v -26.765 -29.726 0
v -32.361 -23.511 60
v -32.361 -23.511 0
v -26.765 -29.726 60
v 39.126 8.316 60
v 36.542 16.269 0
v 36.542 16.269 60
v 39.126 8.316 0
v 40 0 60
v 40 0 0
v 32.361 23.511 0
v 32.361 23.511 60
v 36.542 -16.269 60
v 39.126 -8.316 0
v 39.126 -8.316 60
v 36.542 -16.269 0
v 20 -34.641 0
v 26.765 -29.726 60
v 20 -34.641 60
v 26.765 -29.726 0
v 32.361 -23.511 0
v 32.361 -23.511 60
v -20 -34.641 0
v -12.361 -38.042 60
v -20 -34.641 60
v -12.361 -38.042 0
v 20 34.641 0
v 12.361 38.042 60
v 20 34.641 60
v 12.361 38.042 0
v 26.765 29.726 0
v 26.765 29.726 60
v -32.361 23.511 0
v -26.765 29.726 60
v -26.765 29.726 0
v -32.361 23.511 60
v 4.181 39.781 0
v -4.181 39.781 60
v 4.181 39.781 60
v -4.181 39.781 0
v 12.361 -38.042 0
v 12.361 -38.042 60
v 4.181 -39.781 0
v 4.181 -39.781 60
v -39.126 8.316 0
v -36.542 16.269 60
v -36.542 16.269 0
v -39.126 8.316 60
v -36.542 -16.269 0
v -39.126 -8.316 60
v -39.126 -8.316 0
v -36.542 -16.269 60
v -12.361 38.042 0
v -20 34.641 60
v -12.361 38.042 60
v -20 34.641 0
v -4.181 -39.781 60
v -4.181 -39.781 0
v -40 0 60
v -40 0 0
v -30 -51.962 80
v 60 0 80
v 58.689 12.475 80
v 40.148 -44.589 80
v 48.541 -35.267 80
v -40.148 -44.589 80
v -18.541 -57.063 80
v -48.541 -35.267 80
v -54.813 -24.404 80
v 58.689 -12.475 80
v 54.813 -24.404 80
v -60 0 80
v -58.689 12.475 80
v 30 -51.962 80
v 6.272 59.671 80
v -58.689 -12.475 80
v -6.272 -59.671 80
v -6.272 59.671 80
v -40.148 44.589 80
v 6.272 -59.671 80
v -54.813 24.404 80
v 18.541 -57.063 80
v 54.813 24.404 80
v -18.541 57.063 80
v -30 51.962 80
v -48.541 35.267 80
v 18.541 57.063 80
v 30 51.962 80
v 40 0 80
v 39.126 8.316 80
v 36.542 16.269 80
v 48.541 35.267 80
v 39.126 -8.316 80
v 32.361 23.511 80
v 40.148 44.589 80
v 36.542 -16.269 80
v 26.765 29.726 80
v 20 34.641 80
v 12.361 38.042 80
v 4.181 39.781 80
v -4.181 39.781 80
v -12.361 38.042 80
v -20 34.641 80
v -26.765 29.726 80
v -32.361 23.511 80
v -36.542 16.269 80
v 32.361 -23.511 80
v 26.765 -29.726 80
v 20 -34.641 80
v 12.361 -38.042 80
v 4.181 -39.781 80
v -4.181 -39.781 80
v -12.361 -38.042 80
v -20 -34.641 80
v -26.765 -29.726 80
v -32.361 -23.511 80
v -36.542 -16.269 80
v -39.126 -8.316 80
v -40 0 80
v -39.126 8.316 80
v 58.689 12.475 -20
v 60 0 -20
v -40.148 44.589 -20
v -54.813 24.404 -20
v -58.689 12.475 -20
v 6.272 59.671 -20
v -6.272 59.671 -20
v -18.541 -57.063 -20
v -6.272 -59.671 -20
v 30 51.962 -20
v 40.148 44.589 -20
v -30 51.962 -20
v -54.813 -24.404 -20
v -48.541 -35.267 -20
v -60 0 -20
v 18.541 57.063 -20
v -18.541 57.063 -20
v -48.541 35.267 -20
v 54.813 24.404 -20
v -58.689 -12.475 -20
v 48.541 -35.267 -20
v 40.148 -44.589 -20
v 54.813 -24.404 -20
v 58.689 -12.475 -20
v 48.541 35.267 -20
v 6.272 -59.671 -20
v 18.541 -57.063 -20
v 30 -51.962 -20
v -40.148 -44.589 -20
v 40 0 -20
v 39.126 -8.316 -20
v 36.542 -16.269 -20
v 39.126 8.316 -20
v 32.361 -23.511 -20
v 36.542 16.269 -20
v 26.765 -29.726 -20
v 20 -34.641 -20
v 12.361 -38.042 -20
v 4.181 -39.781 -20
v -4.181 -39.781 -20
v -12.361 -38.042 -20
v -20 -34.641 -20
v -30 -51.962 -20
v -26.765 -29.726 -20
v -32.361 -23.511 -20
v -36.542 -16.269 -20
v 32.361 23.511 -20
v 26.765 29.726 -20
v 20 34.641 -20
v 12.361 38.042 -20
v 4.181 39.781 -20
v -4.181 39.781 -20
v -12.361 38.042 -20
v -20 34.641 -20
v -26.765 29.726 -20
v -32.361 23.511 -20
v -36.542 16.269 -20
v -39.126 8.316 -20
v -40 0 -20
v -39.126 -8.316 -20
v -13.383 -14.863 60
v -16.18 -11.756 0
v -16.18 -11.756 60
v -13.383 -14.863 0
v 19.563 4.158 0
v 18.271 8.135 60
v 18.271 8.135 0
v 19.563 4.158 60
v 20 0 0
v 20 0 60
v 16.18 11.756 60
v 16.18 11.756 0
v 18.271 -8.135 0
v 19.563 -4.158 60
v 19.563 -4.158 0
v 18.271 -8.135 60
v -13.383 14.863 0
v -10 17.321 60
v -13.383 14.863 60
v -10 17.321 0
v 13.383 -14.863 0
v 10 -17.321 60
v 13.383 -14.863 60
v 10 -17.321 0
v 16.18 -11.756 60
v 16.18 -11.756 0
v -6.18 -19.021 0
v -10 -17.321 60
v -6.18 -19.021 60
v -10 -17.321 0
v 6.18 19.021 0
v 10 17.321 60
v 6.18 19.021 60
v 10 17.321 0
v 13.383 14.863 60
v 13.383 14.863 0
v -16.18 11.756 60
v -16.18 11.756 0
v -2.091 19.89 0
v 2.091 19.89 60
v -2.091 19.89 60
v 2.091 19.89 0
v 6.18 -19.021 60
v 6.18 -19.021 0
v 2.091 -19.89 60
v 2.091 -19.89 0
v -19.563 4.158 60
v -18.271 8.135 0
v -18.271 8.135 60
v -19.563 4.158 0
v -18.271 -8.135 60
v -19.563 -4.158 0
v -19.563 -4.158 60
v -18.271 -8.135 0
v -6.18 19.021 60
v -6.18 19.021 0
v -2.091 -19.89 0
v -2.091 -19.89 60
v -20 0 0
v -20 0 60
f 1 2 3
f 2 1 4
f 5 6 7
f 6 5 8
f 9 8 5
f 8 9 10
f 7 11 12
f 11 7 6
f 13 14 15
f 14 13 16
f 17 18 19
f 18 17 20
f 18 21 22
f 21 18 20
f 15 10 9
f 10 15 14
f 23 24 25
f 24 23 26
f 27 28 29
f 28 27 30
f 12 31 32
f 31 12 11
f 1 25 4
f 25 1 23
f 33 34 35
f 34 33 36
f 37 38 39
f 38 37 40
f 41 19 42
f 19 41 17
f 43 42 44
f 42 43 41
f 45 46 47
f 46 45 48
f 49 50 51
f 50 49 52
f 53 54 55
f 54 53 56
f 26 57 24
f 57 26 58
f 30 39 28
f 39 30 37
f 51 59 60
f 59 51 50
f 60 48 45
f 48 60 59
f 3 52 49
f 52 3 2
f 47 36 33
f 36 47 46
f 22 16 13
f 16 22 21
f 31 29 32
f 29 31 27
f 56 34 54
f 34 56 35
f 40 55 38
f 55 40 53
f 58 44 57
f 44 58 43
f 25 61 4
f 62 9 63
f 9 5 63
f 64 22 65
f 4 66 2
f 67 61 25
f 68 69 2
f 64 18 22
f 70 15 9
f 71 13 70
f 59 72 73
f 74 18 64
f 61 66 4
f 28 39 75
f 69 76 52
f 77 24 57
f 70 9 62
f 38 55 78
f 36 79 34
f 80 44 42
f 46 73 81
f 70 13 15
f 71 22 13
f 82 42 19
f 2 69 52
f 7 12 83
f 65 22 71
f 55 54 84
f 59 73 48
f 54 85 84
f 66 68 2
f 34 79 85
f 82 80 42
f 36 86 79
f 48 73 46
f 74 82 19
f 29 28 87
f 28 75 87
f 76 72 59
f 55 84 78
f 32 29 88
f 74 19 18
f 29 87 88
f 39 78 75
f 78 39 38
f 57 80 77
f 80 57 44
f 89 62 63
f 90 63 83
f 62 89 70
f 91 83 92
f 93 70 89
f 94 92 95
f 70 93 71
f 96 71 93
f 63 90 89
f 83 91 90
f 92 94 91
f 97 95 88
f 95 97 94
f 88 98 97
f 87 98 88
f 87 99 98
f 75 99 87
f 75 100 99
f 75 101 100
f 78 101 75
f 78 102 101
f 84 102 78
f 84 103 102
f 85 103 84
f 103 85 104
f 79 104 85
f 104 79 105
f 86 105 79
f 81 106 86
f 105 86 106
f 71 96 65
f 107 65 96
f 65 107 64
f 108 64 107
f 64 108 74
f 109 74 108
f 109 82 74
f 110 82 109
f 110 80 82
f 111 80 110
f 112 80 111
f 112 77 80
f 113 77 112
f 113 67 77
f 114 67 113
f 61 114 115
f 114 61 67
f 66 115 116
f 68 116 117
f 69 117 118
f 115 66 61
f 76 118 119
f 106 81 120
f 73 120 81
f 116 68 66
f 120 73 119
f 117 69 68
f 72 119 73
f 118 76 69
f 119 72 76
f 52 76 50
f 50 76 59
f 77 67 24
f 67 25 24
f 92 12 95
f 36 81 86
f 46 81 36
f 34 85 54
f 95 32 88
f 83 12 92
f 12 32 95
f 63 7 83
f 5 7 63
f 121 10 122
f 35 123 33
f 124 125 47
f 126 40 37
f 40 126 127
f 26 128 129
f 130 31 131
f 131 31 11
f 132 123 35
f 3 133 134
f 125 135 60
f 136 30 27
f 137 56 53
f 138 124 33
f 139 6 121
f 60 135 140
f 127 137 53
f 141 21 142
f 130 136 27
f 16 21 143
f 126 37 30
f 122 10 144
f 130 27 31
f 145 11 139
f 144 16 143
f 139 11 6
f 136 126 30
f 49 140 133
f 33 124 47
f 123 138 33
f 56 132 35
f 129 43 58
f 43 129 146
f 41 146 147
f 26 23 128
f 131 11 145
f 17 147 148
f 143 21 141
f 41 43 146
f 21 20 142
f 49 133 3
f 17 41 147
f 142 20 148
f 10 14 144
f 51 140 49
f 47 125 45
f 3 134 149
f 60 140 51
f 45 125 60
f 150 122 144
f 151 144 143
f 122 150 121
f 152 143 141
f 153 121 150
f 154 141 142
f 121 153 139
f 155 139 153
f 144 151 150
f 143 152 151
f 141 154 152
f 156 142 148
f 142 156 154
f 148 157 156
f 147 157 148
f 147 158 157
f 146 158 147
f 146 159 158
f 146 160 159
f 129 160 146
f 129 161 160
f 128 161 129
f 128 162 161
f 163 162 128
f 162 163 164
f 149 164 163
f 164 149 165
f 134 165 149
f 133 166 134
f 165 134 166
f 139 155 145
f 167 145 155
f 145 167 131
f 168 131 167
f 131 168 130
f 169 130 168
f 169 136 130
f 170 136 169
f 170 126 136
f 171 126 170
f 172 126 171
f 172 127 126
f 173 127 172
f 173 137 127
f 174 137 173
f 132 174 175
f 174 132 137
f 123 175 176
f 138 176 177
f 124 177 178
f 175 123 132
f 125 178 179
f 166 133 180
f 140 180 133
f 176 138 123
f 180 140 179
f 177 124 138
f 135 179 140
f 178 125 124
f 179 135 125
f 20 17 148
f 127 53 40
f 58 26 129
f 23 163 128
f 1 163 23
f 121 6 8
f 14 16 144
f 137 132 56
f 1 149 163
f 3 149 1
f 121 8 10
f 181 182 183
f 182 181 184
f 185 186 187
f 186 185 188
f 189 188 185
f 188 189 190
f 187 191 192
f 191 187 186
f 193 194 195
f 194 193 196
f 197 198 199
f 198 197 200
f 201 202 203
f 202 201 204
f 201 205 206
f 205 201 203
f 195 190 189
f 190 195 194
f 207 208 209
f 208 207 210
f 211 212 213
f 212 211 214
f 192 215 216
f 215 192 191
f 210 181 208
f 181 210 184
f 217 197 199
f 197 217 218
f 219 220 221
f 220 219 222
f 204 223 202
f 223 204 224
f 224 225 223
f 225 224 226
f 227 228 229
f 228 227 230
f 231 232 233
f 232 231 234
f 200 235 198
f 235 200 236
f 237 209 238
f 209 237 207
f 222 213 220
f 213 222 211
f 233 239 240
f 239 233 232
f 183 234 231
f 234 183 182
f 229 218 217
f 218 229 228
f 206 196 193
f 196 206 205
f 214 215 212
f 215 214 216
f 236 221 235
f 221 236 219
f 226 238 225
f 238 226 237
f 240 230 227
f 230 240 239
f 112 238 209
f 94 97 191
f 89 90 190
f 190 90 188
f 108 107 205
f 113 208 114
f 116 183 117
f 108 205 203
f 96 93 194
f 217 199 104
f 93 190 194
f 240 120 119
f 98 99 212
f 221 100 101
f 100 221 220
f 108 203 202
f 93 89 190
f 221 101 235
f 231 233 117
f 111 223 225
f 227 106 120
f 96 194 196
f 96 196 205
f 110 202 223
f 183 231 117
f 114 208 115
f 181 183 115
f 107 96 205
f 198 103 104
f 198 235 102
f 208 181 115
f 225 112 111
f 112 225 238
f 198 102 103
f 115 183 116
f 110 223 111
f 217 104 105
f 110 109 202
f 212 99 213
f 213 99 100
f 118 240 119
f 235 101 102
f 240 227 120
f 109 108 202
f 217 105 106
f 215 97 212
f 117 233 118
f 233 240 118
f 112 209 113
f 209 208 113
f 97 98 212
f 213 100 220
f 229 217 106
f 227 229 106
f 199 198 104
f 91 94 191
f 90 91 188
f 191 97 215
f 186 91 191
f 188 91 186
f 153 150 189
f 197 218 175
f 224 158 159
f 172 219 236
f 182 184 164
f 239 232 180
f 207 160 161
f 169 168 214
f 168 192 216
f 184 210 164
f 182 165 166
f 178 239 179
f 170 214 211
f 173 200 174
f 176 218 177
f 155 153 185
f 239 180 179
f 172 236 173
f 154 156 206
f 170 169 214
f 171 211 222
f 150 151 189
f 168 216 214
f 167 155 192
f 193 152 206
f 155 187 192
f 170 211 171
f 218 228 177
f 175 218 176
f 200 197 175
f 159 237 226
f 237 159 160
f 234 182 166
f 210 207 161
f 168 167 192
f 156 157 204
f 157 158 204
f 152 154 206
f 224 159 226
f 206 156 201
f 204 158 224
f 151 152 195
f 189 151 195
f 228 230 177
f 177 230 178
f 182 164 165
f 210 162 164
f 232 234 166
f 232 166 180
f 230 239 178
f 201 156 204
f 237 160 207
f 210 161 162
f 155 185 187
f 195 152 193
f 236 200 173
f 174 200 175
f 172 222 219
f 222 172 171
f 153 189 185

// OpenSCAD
//cube([2,3,4]); //comment

//difference() {
//	cube(30, center=true);
//	sphere(20                             );
//	}
//
//translate([0, 0, 30]){
//	cylinder(h=40, r=10);
//	}

cylMainDia = 80;
cylHeight = 60;
cylExtnHeight = 20;
cylMaxDia = 120;
cylWallThickness = 20;

//SpoolBody( cylHeight, cylExtnHeight, cylMainDia, cylMaxDia );
//SpoolInner( cylHeight, cylExtnHeight, cylMainDia, cylMaxDia, cylWallThickness);
difference(){
    SpoolBody( cylHeight, cylExtnHeight, cylMainDia, cylMaxDia );
    //cylinder(h=200, d=5);
    SpoolInner( cylHeight, cylExtnHeight, cylMainDia, cylMaxDia, cylWallThickness );
}

module SpoolBody( cylHeight, cylExtnHeight, cylMainDia, cylMaxDia ){
    union(){
        cylinder(h=cylHeight, d=cylMainDia);
        translate([0,0,cylHeight]){
            cylinder(h=cylExtnHeight, d1=cylMainDia, d2=cylMaxDia);
        }
        translate([0,0,-cylExtnHeight]){
            cylinder(h=cylExtnHeight, d1=cylMaxDia, d2=cylMainDia);
        }
    }
}

module SpoolInner( cylHeight, cylExtnHeight, cylMainDia, cylMaxDia, cylWallThickness){
    union(){
        
//        translate([0,0,cylHeight+cylExtnHeight]){
//            cylinder(h=1,d=cylMaxDia-2*cylWallThickness);
//        }
        
        cylinder(h=cylHeight, d=cylMainDia-2*cylWallThickness);
        translate([0,0,cylHeight]){
            cylinder(h=cylExtnHeight, d1=cylMainDia-2*cylWallThickness, d2=cylMaxDia-2*cylWallThickness);
        }
        translate([0,0,-cylExtnHeight]){
            cylinder(h=cylExtnHeight, d1=cylMaxDia-2*cylWallThickness, d2=cylMainDia-2*cylWallThickness);
        }
        
//     translate([0,0,-cylExtnHeight-1]){
//            cylinder(h=1,d=cylMaxDia-2*cylWallThickness);
//        }   
    }
}
